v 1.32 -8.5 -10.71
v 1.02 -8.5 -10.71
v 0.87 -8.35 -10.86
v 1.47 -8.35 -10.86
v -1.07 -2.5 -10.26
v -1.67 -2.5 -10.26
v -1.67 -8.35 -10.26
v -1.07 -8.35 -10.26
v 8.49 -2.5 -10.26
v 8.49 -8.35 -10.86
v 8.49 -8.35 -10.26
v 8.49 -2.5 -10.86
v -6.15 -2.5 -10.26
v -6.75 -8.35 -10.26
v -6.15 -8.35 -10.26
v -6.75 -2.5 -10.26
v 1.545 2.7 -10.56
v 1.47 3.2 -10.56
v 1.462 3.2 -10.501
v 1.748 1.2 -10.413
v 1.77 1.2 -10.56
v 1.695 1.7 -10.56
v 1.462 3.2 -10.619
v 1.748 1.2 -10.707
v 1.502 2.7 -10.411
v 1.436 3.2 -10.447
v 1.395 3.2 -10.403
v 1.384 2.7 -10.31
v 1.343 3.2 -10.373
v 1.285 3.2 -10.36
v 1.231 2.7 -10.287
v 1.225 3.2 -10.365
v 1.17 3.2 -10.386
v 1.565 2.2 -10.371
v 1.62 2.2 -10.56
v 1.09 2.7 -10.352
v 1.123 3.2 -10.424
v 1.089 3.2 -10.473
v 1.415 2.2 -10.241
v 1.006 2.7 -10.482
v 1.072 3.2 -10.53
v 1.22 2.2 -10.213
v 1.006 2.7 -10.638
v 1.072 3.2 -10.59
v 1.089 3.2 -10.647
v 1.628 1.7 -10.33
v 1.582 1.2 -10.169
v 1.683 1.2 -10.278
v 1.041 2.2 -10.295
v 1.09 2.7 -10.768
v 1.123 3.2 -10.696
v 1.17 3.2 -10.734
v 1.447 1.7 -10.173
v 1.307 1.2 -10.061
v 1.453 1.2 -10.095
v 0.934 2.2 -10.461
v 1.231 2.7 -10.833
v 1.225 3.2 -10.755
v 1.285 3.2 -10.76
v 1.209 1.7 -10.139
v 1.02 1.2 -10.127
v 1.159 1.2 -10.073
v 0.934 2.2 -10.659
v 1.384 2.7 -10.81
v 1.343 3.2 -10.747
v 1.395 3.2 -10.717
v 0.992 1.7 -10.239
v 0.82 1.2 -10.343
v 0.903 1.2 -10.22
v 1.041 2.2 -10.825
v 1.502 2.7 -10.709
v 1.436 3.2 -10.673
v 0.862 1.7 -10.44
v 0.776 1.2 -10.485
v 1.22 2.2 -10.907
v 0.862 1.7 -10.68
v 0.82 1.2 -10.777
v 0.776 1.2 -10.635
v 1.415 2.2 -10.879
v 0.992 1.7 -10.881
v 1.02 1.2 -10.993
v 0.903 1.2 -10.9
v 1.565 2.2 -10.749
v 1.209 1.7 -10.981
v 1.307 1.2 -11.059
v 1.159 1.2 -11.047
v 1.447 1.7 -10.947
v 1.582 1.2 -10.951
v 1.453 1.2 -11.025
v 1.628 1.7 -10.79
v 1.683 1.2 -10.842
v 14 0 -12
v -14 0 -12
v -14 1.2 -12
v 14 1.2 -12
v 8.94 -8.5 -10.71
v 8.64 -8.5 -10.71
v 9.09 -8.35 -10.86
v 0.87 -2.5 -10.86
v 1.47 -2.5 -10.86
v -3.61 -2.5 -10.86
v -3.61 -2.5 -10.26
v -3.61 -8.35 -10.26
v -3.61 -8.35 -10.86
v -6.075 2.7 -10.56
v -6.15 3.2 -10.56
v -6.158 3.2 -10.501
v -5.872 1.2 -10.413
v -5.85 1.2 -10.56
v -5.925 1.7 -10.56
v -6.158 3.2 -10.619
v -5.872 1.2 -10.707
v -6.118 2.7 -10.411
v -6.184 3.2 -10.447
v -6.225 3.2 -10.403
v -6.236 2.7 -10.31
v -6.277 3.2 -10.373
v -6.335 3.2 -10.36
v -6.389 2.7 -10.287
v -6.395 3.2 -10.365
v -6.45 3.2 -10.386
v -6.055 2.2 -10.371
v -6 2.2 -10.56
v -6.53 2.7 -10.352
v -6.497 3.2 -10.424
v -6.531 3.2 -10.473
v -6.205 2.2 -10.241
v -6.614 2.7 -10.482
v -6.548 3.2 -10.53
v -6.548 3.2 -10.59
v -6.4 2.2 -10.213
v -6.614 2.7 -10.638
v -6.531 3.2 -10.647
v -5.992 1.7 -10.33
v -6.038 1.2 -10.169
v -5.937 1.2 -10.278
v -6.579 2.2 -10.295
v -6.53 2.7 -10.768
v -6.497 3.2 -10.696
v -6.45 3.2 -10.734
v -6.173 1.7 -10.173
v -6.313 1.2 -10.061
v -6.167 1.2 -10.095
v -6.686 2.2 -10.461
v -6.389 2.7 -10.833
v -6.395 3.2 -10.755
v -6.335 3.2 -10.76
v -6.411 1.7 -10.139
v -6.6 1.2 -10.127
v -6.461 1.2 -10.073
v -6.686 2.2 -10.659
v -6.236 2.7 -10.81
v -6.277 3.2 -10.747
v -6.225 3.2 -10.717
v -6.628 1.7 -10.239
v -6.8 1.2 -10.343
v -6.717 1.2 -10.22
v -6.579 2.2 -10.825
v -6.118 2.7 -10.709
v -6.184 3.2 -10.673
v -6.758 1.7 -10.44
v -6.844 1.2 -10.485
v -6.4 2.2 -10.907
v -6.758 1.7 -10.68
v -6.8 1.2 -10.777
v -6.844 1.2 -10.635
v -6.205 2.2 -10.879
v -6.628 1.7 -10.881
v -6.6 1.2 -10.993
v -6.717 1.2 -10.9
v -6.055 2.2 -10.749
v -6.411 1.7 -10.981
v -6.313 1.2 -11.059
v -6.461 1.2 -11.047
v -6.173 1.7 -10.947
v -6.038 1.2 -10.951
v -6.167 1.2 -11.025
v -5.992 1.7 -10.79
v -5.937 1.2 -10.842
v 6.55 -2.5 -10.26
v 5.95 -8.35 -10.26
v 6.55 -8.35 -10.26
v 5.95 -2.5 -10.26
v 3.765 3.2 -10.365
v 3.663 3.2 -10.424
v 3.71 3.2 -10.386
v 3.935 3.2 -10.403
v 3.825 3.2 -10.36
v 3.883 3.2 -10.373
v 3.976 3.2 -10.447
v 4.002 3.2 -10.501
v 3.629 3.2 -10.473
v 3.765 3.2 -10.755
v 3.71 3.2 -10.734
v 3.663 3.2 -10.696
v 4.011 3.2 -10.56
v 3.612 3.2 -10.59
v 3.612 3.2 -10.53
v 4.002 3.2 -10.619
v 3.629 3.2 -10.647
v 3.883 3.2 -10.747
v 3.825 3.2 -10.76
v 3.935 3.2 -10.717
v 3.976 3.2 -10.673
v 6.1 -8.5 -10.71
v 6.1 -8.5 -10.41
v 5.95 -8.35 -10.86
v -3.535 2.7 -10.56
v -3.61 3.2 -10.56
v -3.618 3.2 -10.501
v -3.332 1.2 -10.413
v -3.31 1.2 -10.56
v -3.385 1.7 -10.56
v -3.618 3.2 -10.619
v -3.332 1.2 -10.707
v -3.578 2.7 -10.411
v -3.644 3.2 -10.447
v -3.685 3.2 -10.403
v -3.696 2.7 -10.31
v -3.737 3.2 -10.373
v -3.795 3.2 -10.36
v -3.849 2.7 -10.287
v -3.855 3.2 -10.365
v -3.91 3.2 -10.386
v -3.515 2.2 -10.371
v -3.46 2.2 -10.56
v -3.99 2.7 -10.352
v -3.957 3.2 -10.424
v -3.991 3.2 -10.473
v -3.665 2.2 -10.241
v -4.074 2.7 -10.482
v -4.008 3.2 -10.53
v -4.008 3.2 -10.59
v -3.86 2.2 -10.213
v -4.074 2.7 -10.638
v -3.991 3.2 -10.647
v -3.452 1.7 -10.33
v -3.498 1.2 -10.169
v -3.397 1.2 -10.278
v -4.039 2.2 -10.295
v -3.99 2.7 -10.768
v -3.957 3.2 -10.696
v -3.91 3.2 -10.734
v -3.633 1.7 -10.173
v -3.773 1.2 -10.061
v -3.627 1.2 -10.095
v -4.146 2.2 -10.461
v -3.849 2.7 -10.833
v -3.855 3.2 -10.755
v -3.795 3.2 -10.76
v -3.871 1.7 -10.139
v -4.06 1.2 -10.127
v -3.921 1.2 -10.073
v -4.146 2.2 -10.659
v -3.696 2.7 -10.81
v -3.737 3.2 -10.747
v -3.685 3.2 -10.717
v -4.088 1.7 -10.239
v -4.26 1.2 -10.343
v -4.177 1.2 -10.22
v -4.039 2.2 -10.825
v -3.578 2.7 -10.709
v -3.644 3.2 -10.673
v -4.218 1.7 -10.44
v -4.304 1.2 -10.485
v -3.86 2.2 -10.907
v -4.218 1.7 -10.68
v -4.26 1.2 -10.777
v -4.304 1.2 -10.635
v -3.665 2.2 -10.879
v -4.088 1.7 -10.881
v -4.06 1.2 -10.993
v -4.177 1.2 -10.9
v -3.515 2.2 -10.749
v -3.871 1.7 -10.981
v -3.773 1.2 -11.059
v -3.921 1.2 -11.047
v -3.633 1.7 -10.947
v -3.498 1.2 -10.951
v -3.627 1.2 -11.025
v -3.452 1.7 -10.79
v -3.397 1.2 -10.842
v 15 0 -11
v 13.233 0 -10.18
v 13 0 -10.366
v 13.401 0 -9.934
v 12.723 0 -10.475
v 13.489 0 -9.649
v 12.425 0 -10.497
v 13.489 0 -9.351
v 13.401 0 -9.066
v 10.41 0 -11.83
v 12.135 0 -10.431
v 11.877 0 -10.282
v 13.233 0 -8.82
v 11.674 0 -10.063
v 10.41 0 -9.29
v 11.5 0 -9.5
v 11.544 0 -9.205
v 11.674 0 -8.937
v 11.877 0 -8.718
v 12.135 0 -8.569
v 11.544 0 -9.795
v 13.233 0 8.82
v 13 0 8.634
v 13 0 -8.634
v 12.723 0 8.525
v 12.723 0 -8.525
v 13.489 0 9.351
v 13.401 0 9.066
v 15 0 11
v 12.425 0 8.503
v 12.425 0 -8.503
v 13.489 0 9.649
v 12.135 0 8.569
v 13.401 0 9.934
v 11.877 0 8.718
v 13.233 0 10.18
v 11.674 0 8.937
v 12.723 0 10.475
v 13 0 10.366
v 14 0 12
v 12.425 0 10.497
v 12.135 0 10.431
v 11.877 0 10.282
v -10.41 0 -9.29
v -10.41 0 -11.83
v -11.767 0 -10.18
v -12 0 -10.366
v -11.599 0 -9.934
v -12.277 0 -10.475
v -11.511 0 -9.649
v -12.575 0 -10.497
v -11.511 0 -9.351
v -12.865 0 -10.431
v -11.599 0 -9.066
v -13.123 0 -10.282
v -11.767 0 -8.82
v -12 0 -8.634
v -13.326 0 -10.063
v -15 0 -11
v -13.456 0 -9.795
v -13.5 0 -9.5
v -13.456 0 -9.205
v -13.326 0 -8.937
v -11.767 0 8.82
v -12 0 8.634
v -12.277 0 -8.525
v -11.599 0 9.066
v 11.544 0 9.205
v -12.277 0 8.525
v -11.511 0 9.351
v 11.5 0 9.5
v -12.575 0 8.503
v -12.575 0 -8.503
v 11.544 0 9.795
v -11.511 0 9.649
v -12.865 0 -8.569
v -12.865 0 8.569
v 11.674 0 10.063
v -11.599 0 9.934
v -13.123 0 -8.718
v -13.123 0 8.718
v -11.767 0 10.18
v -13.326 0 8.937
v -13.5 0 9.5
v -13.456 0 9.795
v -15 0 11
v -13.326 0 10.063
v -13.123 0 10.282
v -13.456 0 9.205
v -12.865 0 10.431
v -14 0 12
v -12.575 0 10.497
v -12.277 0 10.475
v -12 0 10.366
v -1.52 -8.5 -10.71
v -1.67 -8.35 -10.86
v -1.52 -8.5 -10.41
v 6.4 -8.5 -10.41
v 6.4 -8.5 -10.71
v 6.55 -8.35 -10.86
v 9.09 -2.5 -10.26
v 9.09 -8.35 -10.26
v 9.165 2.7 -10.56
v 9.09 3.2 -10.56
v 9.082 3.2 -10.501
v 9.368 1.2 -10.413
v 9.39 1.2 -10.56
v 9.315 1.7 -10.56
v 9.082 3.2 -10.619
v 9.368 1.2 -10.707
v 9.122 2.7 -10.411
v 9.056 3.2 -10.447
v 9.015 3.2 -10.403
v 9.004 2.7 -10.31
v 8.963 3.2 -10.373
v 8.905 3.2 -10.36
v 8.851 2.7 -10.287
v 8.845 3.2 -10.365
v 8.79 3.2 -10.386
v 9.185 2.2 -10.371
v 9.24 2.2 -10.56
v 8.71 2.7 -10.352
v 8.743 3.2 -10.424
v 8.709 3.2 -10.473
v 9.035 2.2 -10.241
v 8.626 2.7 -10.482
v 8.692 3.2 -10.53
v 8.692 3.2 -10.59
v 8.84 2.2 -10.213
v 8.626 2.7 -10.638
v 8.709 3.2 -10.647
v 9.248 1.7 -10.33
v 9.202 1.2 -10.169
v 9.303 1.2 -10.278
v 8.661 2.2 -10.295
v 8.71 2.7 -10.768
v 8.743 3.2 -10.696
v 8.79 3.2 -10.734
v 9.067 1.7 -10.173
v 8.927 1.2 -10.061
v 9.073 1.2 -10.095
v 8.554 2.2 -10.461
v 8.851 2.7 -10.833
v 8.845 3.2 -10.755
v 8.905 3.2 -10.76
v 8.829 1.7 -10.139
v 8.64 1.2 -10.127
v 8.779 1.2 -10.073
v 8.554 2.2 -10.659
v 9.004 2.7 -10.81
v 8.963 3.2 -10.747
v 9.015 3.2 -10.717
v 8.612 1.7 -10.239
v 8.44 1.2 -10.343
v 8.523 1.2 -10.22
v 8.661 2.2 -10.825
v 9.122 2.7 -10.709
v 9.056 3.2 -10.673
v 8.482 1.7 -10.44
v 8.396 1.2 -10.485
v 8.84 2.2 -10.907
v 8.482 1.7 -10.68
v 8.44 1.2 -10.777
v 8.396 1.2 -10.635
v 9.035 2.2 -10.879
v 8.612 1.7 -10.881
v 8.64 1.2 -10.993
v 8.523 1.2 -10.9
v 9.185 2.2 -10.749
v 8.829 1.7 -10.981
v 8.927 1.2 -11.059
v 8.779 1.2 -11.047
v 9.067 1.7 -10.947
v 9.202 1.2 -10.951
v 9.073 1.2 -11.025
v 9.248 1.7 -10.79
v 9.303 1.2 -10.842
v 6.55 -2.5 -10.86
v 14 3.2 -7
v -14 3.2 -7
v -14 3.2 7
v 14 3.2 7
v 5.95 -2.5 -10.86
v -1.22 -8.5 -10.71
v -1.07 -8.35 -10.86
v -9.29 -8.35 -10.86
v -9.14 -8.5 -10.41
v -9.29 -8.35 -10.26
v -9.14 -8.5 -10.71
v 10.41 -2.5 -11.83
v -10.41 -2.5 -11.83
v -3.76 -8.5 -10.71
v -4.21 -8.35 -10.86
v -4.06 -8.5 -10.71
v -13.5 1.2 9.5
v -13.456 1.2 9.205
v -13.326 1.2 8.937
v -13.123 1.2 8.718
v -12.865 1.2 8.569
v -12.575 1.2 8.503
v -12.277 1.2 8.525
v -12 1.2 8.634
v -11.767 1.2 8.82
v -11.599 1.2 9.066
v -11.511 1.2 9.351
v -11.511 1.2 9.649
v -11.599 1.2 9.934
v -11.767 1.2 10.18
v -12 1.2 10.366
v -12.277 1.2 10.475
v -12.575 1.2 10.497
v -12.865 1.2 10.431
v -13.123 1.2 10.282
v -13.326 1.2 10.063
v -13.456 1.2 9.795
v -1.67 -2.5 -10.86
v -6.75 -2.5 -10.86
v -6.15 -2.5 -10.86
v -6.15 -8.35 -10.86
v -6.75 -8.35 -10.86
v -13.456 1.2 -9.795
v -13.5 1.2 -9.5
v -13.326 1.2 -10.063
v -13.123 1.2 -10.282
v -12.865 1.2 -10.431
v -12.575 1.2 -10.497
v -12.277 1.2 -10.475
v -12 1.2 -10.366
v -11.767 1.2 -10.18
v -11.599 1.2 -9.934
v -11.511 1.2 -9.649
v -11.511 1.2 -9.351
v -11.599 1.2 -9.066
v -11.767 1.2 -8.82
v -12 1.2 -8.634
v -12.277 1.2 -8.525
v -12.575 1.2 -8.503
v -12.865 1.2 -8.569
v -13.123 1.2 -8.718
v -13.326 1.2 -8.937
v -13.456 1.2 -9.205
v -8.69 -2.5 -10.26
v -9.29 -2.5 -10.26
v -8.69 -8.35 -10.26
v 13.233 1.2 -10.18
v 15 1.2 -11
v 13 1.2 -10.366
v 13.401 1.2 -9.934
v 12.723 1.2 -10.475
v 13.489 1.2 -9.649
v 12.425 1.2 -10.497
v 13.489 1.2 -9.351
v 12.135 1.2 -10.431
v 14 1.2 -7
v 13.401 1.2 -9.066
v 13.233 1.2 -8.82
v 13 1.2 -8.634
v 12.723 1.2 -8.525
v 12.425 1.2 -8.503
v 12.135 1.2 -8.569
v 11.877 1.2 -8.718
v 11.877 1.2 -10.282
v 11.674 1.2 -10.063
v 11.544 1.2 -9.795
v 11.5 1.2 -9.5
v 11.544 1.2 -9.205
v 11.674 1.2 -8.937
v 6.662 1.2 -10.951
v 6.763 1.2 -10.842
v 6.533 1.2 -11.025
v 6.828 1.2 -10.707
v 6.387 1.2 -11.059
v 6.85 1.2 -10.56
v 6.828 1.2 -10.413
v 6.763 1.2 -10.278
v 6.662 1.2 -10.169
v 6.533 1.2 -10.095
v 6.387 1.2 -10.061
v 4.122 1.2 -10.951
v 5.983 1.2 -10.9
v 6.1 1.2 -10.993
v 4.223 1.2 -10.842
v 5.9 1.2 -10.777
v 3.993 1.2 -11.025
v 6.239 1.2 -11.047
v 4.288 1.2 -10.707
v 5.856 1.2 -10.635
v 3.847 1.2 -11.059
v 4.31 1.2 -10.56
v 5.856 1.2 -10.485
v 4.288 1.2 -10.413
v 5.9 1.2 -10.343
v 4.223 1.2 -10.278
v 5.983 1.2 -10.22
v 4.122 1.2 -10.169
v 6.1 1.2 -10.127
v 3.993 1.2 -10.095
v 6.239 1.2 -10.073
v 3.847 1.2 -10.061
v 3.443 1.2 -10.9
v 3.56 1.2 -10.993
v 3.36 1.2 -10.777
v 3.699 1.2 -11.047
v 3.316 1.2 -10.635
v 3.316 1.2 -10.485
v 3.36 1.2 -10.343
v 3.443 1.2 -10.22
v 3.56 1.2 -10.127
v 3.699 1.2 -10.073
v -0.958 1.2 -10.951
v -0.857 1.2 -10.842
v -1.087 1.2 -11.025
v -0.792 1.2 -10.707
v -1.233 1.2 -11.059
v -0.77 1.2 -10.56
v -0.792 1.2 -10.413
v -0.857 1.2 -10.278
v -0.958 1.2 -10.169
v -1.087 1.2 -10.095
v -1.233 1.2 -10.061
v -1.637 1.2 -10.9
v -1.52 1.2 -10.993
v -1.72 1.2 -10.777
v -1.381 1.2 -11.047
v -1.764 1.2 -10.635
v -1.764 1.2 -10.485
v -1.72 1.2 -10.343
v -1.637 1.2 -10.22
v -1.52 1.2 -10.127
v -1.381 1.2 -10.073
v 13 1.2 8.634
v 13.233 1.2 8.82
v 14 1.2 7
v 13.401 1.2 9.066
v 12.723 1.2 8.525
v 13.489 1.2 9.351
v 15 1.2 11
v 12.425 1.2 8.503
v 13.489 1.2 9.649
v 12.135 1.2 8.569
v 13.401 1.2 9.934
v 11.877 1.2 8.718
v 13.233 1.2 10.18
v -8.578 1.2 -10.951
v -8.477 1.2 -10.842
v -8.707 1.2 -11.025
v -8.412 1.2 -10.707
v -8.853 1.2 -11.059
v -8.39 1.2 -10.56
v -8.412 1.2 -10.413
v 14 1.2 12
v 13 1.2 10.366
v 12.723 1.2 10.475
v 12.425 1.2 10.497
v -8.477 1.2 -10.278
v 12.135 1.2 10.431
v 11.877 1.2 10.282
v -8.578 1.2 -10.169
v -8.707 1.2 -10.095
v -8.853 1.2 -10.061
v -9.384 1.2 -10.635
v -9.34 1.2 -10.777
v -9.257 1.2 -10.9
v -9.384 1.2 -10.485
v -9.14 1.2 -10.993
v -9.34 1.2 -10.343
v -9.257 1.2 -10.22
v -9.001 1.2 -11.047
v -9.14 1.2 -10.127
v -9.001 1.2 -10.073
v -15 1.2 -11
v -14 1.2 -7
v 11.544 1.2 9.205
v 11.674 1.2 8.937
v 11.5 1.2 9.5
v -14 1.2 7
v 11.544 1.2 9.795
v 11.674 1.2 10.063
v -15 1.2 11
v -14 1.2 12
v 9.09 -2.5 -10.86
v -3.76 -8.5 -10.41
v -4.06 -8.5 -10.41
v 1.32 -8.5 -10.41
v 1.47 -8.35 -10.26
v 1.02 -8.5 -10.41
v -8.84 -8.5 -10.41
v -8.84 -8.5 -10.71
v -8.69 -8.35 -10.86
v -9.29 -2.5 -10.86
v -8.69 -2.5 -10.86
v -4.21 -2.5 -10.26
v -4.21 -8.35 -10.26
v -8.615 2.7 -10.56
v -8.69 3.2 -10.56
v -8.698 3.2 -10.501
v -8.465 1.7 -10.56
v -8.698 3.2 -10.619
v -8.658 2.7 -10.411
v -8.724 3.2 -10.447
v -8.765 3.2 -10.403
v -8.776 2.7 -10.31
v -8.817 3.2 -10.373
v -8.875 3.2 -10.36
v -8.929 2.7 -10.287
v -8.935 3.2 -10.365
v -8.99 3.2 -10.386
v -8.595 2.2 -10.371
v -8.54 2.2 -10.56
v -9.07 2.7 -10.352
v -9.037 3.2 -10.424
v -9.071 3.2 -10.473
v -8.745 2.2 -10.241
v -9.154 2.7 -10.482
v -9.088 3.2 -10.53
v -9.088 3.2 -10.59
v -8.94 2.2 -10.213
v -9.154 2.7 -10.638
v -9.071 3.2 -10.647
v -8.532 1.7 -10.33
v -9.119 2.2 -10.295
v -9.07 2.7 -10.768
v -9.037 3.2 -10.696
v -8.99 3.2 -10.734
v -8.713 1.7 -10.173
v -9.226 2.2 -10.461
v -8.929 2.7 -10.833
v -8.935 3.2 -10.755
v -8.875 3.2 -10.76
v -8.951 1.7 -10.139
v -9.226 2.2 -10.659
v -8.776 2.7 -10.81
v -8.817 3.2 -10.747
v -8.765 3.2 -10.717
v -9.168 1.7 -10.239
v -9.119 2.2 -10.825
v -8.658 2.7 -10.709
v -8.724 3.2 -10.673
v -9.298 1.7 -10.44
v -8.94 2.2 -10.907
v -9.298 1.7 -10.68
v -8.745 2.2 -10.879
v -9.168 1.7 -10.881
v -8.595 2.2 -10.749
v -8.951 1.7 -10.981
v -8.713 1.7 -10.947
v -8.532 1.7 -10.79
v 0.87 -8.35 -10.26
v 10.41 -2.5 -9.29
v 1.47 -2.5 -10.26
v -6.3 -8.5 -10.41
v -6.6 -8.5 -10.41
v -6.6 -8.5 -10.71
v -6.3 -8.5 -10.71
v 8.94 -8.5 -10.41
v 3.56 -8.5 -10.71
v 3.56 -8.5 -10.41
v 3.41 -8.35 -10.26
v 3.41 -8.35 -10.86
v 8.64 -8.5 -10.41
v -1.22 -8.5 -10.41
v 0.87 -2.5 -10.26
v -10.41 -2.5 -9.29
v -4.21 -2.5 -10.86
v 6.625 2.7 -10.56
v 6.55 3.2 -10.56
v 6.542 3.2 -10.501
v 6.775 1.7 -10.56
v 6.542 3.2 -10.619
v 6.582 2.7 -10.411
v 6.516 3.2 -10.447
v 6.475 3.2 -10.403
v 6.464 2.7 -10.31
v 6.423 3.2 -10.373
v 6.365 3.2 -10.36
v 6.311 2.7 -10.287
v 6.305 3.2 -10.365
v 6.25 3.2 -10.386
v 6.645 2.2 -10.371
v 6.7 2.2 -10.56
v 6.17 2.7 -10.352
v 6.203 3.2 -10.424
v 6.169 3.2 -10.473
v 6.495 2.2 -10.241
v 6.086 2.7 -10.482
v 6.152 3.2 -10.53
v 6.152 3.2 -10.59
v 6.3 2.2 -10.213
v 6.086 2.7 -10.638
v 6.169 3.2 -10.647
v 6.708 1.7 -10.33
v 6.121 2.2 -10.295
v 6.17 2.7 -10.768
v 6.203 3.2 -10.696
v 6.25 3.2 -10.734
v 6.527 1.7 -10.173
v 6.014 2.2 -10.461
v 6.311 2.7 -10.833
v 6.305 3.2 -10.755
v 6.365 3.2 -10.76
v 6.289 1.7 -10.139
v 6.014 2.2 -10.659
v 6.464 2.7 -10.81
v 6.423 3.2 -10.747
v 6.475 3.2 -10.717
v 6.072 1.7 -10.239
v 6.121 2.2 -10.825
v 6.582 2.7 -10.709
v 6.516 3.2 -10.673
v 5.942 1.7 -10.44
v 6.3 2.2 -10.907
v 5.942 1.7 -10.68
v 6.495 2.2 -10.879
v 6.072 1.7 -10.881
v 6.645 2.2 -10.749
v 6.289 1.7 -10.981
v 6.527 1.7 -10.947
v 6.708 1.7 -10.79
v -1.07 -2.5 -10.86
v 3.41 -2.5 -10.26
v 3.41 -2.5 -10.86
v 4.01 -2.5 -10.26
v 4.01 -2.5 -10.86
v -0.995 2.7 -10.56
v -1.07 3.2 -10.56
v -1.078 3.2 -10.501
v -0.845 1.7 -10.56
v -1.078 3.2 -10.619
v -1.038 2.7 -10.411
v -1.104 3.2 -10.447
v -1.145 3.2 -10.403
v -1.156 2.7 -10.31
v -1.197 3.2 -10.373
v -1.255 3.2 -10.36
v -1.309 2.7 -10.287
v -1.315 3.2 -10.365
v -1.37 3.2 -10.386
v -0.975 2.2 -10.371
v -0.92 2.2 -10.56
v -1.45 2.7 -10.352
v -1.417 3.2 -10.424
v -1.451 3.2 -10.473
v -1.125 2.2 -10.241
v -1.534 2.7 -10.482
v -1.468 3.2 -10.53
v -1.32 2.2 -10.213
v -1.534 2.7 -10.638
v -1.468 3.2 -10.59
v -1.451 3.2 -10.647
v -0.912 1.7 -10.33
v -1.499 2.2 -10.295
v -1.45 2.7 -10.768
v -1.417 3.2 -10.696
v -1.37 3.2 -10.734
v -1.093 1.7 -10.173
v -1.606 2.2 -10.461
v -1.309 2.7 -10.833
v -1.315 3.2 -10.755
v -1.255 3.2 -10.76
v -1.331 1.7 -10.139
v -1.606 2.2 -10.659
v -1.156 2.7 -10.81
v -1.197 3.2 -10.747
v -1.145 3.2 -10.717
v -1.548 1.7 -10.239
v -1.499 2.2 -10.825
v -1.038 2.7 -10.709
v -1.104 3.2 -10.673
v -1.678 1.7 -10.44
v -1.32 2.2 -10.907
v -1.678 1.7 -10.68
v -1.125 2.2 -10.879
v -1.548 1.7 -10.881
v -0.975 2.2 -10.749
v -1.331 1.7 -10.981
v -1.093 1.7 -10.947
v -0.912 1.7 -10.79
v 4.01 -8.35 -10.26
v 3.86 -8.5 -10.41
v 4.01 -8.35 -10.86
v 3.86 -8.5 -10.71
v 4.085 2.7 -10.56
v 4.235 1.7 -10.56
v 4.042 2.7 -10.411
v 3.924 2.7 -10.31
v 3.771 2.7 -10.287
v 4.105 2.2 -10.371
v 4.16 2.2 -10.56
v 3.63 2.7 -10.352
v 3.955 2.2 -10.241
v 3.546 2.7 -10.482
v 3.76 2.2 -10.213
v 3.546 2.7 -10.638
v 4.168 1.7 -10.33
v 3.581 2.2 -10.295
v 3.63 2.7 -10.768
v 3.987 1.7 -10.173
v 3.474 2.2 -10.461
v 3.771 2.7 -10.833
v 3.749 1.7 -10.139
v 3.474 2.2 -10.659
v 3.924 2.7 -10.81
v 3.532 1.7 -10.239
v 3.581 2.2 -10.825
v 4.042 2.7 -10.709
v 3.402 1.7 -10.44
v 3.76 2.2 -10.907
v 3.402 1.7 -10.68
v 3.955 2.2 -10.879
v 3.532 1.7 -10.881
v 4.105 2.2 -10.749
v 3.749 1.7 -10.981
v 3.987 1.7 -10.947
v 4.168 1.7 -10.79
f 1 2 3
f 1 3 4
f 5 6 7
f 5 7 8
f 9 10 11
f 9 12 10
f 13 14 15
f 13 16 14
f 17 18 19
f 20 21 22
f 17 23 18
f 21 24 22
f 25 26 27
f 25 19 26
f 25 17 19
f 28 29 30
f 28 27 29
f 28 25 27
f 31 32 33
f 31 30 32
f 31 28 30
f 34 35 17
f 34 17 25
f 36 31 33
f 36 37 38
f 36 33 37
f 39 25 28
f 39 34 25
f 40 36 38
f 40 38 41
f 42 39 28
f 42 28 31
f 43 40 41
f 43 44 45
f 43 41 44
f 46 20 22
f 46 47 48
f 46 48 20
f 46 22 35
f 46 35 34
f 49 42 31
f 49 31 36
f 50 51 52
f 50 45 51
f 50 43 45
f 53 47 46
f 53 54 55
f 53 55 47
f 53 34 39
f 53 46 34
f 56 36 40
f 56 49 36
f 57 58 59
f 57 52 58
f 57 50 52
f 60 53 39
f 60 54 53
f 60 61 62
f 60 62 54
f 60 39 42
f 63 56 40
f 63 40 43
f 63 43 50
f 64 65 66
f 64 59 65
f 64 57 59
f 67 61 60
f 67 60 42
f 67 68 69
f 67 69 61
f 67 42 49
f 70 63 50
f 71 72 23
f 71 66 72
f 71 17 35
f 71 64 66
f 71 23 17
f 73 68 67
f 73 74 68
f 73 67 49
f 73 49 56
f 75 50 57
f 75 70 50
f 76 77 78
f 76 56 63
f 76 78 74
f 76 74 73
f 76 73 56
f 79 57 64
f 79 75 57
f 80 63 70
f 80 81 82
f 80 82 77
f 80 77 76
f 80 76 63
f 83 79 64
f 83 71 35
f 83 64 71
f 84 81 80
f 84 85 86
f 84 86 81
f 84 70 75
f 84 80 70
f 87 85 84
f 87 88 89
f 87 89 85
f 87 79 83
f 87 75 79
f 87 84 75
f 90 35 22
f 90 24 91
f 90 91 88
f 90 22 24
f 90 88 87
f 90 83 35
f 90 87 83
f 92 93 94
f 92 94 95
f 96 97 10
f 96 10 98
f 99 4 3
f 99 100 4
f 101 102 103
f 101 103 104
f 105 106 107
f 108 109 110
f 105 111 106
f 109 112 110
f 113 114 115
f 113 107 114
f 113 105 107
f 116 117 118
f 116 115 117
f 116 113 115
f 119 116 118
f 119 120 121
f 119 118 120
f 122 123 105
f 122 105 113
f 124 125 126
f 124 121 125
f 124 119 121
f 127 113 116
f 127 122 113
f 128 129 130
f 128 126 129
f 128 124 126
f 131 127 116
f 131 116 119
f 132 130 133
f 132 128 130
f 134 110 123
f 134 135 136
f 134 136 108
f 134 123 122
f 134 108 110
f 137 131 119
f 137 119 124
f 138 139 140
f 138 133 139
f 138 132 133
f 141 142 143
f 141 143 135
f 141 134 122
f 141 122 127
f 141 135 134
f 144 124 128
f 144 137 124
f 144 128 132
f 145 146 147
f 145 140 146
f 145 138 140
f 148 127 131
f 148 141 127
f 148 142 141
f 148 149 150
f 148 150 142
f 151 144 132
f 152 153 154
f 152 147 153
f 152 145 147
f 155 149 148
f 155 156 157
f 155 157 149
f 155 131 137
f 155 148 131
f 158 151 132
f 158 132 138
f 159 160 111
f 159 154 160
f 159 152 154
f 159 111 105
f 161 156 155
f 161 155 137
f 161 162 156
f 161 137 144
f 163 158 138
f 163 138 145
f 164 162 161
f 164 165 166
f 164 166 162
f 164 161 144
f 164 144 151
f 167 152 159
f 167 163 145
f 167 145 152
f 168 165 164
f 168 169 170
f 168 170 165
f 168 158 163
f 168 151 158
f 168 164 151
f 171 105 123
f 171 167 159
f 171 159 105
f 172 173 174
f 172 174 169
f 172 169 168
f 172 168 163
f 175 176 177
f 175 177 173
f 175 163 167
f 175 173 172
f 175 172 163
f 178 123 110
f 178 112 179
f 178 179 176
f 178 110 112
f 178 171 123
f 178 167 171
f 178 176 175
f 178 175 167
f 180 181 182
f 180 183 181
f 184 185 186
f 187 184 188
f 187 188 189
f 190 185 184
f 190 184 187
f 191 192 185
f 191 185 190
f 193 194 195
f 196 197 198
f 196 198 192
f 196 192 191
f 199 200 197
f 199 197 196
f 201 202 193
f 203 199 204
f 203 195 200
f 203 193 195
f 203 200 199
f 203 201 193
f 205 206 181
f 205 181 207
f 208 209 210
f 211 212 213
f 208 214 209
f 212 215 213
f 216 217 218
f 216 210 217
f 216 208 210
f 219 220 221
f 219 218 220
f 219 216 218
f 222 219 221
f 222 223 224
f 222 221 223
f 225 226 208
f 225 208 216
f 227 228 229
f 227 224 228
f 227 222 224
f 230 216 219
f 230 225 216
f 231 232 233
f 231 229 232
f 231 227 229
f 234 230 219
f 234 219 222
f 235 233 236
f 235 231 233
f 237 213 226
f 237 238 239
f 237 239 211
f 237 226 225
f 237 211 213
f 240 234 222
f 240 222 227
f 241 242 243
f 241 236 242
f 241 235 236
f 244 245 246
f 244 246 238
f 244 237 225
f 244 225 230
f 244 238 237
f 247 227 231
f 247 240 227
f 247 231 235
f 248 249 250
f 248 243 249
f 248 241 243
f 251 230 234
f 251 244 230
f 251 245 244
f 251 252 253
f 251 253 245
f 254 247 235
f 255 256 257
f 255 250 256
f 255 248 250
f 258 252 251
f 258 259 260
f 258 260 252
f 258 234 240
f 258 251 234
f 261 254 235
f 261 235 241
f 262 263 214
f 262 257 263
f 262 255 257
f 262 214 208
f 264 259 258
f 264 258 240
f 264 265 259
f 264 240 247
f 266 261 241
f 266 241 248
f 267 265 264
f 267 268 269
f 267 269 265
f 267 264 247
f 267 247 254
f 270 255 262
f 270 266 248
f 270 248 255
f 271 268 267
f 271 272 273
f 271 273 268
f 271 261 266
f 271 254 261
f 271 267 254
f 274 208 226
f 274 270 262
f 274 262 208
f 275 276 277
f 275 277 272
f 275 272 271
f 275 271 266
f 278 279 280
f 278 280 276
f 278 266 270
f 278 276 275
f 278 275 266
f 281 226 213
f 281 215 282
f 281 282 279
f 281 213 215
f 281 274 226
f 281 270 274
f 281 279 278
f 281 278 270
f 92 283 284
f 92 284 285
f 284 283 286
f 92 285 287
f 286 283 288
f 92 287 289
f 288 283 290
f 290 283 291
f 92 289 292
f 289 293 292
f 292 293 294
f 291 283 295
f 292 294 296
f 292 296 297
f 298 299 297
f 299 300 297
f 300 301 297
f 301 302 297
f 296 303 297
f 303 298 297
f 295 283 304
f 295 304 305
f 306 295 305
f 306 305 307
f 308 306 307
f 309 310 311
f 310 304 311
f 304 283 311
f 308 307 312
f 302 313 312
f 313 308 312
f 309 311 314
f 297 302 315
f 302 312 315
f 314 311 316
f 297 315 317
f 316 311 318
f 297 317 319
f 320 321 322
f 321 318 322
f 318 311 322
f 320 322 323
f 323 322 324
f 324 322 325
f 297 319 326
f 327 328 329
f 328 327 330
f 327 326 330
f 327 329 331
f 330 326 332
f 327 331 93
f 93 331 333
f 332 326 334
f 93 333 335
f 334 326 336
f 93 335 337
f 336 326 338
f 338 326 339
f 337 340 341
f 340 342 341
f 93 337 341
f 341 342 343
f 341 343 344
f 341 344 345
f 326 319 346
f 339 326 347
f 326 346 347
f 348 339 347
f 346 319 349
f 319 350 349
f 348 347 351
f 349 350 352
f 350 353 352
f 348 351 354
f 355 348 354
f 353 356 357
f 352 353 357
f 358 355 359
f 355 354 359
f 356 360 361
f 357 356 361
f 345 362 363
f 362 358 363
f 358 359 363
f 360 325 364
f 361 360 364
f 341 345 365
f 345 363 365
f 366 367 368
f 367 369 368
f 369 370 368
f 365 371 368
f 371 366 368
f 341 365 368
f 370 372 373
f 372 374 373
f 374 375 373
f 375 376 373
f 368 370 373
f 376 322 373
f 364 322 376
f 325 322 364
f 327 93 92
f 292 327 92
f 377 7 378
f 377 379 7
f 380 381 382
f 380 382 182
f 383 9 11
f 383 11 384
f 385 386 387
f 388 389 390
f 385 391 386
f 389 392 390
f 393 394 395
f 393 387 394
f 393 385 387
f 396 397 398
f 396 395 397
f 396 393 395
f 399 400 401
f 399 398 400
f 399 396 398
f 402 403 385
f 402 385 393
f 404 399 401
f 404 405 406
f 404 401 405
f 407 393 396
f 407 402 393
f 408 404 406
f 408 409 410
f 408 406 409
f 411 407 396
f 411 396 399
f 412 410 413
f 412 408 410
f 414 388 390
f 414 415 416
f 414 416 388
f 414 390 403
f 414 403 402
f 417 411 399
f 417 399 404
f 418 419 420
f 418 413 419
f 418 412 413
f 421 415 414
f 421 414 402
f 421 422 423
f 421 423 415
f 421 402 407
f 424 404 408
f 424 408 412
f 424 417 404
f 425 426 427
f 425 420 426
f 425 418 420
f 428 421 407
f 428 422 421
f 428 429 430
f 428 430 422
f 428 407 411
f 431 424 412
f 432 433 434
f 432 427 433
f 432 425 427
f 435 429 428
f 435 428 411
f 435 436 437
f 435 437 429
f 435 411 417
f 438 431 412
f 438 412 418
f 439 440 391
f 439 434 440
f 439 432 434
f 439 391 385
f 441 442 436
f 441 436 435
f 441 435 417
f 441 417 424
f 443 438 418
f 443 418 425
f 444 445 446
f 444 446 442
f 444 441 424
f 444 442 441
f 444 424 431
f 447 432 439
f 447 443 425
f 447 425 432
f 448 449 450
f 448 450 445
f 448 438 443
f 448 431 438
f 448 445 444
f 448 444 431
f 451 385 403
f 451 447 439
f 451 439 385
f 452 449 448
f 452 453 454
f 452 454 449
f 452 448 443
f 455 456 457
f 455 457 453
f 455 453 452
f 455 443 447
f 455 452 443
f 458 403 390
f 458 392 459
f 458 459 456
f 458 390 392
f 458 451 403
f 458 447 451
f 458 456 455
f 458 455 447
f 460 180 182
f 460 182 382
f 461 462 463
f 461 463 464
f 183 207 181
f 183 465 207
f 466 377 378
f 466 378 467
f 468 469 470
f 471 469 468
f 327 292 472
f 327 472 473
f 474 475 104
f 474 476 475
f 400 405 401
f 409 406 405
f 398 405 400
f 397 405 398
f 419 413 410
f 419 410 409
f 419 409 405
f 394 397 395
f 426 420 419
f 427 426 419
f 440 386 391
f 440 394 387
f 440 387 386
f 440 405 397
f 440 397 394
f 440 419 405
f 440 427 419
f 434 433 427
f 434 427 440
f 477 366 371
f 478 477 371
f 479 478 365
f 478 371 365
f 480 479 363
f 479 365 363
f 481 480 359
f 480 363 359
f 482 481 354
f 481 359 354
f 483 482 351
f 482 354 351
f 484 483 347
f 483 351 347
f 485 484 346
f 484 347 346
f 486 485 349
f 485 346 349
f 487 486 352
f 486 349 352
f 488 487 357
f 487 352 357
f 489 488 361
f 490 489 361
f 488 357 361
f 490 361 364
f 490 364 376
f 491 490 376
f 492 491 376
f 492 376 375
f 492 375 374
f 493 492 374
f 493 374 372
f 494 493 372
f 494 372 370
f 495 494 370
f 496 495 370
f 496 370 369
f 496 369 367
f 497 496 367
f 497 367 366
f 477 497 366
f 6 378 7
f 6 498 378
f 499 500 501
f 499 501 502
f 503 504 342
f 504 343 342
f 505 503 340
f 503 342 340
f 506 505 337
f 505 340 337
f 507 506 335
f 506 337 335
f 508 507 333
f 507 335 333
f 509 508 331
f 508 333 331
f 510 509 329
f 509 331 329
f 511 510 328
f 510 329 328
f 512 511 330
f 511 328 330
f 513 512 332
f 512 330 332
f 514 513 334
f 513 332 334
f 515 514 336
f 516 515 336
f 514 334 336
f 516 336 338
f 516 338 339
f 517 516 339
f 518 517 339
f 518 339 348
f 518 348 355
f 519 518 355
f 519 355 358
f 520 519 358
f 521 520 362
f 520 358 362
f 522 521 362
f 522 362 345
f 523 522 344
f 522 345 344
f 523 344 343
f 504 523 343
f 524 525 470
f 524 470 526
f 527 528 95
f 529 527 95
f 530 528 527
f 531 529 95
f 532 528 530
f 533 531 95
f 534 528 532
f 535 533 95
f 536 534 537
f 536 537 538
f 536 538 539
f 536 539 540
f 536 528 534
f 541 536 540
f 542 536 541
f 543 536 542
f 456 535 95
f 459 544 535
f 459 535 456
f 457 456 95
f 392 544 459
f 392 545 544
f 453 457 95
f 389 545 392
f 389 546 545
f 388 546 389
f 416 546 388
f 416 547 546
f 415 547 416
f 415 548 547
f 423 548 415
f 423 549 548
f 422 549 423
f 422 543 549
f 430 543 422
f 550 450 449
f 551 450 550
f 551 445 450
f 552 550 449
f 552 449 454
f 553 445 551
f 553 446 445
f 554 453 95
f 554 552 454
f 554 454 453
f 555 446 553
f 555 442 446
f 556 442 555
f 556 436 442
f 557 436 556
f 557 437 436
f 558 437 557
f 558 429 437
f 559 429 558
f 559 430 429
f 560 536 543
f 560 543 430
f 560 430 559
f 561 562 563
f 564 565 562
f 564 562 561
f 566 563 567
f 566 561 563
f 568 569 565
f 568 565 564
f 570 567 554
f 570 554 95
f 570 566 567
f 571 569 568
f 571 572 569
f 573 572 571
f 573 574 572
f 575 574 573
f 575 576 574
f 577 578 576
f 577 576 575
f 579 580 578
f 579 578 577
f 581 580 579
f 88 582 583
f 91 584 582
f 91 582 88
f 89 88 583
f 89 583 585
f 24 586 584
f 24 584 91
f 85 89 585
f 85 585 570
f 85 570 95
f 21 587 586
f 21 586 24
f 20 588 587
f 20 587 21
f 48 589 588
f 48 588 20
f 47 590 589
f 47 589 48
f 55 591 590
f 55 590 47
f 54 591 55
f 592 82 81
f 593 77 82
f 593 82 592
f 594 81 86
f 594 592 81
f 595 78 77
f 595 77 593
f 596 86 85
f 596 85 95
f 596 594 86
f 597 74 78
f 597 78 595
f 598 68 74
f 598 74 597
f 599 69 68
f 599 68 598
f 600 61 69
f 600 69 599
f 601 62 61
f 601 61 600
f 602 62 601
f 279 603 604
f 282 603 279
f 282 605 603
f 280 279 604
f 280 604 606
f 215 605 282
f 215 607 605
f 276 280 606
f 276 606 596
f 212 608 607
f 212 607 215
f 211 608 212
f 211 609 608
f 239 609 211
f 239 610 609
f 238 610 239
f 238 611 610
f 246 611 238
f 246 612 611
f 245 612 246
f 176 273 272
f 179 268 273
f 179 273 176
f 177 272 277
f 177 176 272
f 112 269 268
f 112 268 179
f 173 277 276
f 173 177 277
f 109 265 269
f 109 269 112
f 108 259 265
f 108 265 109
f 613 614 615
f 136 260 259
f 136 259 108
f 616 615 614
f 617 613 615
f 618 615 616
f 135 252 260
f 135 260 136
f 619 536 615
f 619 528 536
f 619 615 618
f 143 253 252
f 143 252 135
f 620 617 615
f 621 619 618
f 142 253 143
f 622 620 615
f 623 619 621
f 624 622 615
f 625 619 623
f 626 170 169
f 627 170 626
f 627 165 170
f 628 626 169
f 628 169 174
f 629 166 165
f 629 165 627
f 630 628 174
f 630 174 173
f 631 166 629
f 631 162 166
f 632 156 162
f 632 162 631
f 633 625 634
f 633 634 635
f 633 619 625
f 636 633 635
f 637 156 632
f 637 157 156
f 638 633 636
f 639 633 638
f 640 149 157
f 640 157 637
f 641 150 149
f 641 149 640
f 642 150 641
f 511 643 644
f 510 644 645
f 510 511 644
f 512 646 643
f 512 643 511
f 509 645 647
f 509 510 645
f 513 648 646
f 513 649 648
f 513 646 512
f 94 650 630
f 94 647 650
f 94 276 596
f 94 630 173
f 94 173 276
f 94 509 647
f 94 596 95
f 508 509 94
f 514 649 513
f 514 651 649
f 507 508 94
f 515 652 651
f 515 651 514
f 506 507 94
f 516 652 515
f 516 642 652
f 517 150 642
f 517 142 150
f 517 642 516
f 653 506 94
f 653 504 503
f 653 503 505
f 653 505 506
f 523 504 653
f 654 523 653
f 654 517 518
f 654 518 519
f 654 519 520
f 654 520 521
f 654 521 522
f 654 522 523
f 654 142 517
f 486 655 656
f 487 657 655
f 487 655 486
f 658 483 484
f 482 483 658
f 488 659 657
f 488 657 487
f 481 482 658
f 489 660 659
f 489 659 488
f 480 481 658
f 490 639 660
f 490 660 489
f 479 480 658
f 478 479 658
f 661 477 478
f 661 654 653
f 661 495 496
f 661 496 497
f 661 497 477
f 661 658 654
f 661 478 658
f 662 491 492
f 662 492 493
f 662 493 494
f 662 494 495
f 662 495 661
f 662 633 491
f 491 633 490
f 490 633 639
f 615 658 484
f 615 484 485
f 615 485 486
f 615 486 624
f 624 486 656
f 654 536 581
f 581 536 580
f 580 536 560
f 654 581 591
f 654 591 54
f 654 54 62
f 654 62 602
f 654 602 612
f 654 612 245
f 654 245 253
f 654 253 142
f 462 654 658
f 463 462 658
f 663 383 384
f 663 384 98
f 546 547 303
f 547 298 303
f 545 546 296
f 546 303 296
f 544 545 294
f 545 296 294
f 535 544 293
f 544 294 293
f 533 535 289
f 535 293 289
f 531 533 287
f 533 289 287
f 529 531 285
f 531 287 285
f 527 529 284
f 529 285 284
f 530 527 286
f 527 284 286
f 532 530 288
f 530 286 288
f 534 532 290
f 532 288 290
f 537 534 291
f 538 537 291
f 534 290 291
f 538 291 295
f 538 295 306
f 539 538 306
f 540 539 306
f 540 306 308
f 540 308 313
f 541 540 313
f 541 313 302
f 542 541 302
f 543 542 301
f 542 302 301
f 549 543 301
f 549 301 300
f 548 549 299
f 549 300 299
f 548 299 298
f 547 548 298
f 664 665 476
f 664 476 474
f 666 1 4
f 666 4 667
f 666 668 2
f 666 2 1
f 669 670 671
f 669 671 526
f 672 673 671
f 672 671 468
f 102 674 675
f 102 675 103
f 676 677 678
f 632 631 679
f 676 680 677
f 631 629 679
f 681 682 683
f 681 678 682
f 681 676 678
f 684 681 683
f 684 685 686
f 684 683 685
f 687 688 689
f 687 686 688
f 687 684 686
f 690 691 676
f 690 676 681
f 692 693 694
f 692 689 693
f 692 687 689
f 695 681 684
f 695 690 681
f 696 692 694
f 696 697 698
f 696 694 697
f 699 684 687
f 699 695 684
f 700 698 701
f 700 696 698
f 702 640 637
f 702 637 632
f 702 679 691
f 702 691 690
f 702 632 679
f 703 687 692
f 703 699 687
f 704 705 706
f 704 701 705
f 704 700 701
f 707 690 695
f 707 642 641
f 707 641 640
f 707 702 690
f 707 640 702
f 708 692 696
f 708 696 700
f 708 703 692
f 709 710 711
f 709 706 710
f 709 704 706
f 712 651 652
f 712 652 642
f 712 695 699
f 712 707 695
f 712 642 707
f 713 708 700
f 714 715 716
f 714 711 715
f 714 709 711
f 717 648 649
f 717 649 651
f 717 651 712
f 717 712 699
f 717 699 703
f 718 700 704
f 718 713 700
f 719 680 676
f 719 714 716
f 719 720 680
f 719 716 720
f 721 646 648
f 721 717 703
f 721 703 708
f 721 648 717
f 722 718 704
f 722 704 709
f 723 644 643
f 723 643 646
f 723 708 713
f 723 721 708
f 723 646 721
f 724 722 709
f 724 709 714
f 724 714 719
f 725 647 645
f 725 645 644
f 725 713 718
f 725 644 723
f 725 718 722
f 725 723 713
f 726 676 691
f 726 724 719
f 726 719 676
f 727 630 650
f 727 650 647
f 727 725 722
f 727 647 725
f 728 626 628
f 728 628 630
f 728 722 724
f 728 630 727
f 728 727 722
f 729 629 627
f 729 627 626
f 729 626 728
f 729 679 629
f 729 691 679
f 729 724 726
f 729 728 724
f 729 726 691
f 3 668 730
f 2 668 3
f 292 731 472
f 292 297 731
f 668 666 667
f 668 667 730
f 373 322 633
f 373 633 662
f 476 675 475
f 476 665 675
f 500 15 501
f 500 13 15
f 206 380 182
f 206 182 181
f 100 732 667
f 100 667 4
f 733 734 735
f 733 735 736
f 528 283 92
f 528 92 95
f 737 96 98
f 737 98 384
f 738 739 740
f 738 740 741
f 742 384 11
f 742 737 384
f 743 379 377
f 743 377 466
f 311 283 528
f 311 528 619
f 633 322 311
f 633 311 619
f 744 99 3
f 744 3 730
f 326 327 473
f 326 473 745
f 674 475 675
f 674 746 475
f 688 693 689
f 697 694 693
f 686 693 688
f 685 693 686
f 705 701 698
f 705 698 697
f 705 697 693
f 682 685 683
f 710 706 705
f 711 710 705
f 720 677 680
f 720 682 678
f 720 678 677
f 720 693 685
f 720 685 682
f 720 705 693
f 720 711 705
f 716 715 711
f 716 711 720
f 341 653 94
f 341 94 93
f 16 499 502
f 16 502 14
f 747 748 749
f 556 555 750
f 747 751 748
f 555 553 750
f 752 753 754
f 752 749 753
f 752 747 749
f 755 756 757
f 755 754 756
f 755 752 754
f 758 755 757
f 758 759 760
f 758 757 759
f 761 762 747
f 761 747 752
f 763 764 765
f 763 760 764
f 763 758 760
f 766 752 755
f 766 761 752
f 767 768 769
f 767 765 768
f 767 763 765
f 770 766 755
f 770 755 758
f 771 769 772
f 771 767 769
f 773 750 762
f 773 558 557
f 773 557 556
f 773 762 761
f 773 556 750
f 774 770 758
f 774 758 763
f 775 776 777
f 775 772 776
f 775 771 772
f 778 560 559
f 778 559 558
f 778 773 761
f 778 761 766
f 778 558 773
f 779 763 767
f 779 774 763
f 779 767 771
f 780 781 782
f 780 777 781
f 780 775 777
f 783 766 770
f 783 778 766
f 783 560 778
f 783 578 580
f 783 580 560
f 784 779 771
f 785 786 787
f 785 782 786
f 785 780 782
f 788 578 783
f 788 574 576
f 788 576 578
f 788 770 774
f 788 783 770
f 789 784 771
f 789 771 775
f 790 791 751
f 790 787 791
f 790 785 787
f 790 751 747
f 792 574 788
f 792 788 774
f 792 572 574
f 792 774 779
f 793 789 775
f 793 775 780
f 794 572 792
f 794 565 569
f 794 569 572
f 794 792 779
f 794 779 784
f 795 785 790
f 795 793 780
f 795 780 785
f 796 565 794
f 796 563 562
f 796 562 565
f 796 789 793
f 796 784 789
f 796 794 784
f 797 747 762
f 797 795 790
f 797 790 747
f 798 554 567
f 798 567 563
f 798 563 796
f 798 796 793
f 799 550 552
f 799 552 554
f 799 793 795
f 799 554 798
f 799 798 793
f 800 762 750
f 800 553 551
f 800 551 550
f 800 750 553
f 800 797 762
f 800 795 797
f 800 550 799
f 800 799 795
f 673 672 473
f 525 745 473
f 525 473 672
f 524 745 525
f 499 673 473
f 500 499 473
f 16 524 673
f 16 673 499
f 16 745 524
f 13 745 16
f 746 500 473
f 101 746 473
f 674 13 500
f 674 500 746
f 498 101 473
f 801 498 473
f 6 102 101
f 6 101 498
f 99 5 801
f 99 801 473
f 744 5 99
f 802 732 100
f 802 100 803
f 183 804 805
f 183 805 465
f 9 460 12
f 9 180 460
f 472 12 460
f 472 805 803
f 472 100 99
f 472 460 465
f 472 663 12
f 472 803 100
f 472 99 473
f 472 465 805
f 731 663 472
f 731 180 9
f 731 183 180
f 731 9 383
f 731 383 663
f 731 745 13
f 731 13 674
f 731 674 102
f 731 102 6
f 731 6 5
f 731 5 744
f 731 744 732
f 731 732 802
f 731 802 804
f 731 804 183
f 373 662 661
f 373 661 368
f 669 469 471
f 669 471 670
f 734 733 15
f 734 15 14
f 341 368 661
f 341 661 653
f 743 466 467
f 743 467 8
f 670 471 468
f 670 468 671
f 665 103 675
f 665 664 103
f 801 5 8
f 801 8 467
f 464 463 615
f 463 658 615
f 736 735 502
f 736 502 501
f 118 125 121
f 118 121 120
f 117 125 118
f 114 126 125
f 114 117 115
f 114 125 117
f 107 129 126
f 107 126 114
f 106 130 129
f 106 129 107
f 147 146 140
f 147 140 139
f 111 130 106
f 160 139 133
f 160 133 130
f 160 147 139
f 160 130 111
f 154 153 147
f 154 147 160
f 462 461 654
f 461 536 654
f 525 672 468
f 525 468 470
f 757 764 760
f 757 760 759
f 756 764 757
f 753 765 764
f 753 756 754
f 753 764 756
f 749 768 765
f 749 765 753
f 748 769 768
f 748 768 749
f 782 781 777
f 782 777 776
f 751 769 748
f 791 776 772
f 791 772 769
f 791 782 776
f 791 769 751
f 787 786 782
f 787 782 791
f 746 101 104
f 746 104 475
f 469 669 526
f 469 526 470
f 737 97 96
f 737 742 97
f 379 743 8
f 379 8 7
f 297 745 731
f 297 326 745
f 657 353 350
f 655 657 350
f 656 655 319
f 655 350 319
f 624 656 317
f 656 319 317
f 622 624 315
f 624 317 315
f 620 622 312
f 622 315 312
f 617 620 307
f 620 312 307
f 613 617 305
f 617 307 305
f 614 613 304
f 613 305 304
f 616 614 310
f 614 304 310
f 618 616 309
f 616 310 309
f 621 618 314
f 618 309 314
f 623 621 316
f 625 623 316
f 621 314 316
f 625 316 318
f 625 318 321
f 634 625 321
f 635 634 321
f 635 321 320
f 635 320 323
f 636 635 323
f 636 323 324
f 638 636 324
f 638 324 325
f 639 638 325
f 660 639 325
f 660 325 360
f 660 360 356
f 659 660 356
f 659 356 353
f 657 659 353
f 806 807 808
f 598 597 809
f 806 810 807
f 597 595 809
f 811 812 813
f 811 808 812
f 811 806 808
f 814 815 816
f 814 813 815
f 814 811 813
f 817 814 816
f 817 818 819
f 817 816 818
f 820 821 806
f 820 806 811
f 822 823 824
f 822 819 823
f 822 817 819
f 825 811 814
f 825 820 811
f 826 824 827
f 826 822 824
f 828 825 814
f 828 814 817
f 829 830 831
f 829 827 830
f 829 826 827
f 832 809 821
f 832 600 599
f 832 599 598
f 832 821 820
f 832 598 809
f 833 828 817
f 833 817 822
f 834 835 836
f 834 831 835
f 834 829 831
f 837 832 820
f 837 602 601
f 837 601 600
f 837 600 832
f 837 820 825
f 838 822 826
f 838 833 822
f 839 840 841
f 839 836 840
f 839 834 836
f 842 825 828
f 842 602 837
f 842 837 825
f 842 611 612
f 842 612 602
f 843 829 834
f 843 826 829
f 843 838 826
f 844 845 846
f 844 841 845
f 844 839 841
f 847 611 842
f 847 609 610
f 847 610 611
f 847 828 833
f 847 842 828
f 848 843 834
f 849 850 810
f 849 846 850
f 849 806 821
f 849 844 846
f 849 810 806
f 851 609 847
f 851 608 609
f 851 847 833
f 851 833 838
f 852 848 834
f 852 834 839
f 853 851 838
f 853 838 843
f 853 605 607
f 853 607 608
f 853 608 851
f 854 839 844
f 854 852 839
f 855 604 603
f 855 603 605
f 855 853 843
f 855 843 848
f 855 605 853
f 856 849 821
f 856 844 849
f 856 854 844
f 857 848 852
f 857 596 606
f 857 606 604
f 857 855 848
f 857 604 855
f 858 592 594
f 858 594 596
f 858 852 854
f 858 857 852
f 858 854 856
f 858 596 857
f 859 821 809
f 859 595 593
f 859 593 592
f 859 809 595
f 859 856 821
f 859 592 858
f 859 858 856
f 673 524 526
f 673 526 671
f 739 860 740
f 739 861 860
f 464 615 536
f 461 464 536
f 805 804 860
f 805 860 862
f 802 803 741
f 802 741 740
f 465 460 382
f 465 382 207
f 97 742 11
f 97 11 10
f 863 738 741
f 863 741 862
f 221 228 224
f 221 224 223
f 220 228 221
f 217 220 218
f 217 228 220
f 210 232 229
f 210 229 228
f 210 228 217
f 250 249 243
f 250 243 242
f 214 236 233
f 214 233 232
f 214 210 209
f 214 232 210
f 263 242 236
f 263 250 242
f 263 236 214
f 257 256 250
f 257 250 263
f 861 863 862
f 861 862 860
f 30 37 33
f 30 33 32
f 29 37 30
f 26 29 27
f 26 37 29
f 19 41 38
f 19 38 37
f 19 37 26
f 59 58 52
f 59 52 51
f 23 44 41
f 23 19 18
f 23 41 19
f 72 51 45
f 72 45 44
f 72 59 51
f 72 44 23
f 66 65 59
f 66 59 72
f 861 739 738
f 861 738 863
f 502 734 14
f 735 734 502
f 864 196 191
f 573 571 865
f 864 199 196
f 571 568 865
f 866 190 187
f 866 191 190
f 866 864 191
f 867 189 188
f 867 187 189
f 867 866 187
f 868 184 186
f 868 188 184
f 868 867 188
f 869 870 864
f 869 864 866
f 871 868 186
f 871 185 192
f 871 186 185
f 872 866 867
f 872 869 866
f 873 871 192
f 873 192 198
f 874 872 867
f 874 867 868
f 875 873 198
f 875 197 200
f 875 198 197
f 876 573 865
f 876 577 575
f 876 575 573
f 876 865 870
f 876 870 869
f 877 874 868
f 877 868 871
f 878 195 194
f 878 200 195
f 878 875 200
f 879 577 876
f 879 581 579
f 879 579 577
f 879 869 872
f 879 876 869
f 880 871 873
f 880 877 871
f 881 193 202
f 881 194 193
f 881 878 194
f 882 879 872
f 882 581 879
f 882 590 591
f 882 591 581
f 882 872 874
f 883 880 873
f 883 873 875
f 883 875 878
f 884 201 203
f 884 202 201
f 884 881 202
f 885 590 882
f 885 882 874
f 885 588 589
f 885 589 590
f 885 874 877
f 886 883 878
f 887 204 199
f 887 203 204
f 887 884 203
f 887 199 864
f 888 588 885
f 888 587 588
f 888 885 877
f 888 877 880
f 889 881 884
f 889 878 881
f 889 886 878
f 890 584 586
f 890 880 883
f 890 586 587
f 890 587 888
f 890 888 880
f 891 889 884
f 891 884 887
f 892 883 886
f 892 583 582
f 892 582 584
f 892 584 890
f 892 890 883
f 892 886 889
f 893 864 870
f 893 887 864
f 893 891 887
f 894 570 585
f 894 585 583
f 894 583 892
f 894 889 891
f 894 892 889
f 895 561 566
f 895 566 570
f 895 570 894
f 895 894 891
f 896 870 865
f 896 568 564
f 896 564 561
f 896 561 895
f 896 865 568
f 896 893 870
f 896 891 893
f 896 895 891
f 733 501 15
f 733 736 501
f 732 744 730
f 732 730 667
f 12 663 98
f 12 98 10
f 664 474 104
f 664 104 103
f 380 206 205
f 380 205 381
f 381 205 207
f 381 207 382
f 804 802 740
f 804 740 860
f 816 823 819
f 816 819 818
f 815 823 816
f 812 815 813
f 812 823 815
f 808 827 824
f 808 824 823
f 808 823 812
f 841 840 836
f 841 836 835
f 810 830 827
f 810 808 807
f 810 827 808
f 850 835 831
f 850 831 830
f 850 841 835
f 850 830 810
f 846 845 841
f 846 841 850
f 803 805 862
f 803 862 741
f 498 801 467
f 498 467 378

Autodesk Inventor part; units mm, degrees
ref_plane "YZ Plane" through (0, 0, 0) normal (1, 0, 0) x (0, 1, 0)
ref_plane "XZ Plane" through (0, 0, 0) normal (0, 1, 0) x (-1, 0, 0)
ref_plane "XY Plane" through (0, 0, 0) normal (0, 0, 1) x (1, 0, 0)
sketch "스케치1" plane through (0, 0, 0) normal (0, 1, 0) x (-1, 0, 0)
  line L0 (15, -12) -> (-15, -12)
  line L1 (-15, -12) -> (-15, 12)
  line L2 (-15, 12) -> (15, 12)
  line L3 (15, 12) -> (15, -12)
  line L4 (15, -12) -> (-15, 12) construction
  line L5 (-15, -12) -> (15, 12) construction
  line L6 (12.5, 9.5) -> (-12.5, 9.5)
  line L7 (-12.5, 9.5) -> (-12.5, -9.5)
  line L8 (-12.5, -9.5) -> (12.5, -9.5)
  line L9 (12.5, -9.5) -> (12.5, 9.5)
  line L10 (12.5, 9.5) -> (-12.5, -9.5) construction
  line L11 (-12.5, 9.5) -> (12.5, -9.5) construction
  circle A0 centre (12.5, -9.5) radius 1
  circle A1 centre (-12.5, -9.5) radius 1
  circle A2 centre (-12.5, 9.5) radius 1
  circle A3 centre (12.5, 9.5) radius 1
  point P0 (0, 0)
  dimension "d0" = 30
  dimension "d1" = 24
  dimension "d2" = 25
  dimension "d3" = 19
  dimension "d4" = 2
  dimension "d5" = 2
  dimension "d6" = 2
  dimension "d7" = 2
extrude "돌출1" add sketch "스케치1" along normal blind 1.2 contours L0 L1 L2 L3 | L6 A3 L9 A0 L8 A1 L7 A2
sketch "스케치2" plane through (0, 1.2, 0) normal (0, 1, 0) x (1, 0, 0)
  line L0 (-14, -7) -> (14, -7)
  line L1 (14, -7) -> (14, 7)
  line L2 (14, 7) -> (-14, 7)
  line L3 (-14, 7) -> (-14, -7)
  line L4 (-14, -7) -> (14, 7) construction
  line L5 (14, -7) -> (-14, 7) construction
  point P0 (0, 0)
  dimension "d10" = 28
  dimension "d11" = 14
extrude "돌출2" add sketch "스케치2" along normal blind 2
sketch "스케치3" plane through (0, 1.2, 0) normal (0, 1, 0) x (1, 0, 0)
  line L0 (15, -12) -> (15, 12) projected
  line L1 (15, 12) -> (-15, 12) projected
  circle A0 centre (-8.89, 10.56) radius 0.5
  circle A1 centre (-6.35, 10.56) radius 0.5
  circle A2 centre (-3.81, 10.56) radius 0.5
  circle A3 centre (-1.27, 10.56) radius 0.5
  circle A4 centre (1.27, 10.56) radius 0.5
  circle A5 centre (3.81, 10.56) radius 0.5
  circle A6 centre (6.35, 10.56) radius 0.5
  circle A7 centre (8.89, 10.56) radius 0.5
  point P0 (0, 0)
  dimension "d14" = 2.54
  dimension "d15" = 2.54
  dimension "d16" = 2.54
  dimension "d17" = 2.54
  dimension "d18" = 2.54
  dimension "d19" = 2.54
  dimension "d20" = 2.54
  dimension "d22" = 1.44
  dimension "d23" = 1
  dimension "d24" = 1
  dimension "d25" = 1
  dimension "d26" = 1
  dimension "d27" = 1
  dimension "d28" = 1
  dimension "d29" = 1
  dimension "d53" = 1
  dimension "d113" = 13.73
extrude "돌출3" add sketch "스케치3" along normal blind 2
chamfer "모따기1" distance 0.3 distance2 2 1 edges at (5.85, 3.2, -10.56) measured on face at (6.1668, 3.2, -10.6561)
chamfer "모따기2" distance 0.3 distance2 2 1 edges at (3.31, 3.2, -10.56) measured on face at (3.8691, 3.2, -10.4042)
chamfer "모따기3" distance 0.3 distance2 2 1 edges at (0.77, 3.2, -10.56) measured on face at (1.1007, 3.2, -10.7255)
chamfer "모따기4" distance 0.3 distance2 2 1 edges at (-1.77, 3.2, -10.56) measured on face at (-1.4393, 3.2, -10.7255)
chamfer "모따기5" distance 0.3 distance2 2 1 edges at (-4.31, 3.2, -10.56) measured on face at (-3.8038, 3.2, -10.4639)
chamfer "모따기6" distance 0.3 distance2 2 1 edges at (-6.85, 3.2, -10.56) measured on face at (-6.4319, 3.2, -10.5921)
chamfer "모따기7" distance 0.3 distance2 2 1 edges at (-9.39, 3.2, -10.56) measured on face at (-9.0639, 3.2, -10.4132)
chamfer "모따기8" distance 0.3 distance2 2 1 edges at (8.39, 3.2, -10.56) measured on face at (9.0549, 3.2, -10.6705)
sketch "스케치4" plane through (0, 0, 0) normal (0, -1, 0) x (1, 0, 0)
  circle A0 centre (6.35, -10.56) radius 0.5 projected
  circle A1 centre (3.81, -10.56) radius 0.5 projected
  circle A2 centre (1.27, -10.56) radius 0.5 projected
  circle A3 centre (-1.27, -10.56) radius 0.5 projected
  circle A4 centre (-3.81, -10.56) radius 0.5 projected
  circle A5 centre (-6.35, -10.56) radius 0.5 projected
  circle A6 centre (-8.89, -10.56) radius 0.5 projected
  circle A7 centre (8.89, -10.56) radius 0.5 projected
  line L0 (10.41, -11.83) -> (-10.41, -11.83)
  line L1 (-10.41, -11.83) -> (-10.41, -9.29)
  line L2 (-10.41, -9.29) -> (10.41, -9.29)
  line L3 (10.41, -9.29) -> (10.41, -11.83)
  point P0 (0, 0)
  dimension "d57" = 20.82
  dimension "d58" = 2.54
  dimension "d59" = 1.52
  dimension "d60" = 1.27
extrude "돌출4" add sketch "스케치4" along normal blind 2.5 contours A0 | A1 | A2 | A3 | A4 | A5 | A6 | A7 | L0 L1 L2 L3
sketch "스케치5" plane through (0, -2.5, 0) normal (0, -1, 0) x (1, 0, 0)
  circle A0 centre (8.89, -10.56) radius 0.5 projected
  circle A1 centre (6.35, -10.56) radius 0.5 projected
  circle A2 centre (3.81, -10.56) radius 0.5 projected
  circle A3 centre (1.27, -10.56) radius 0.5 projected
  circle A4 centre (-1.27, -10.56) radius 0.5 projected
  circle A5 centre (-3.81, -10.56) radius 0.5 projected
  circle A6 centre (-6.35, -10.56) radius 0.5 projected
  circle A7 centre (-8.89, -10.56) radius 0.5 projected
  line L0 (9.09, -10.86) -> (8.49, -10.86)
  line L1 (8.49, -10.86) -> (8.49, -10.26)
  line L2 (8.49, -10.26) -> (9.09, -10.26)
  line L3 (9.09, -10.26) -> (9.09, -10.86)
  line L4 (9.09, -10.86) -> (8.49, -10.26) construction
  line L5 (8.49, -10.86) -> (9.09, -10.26) construction
  line L6 (6.55, -10.86) -> (5.95, -10.86)
  line L7 (6.55, -10.26) -> (6.55, -10.86)
  line L8 (5.95, -10.26) -> (6.55, -10.26)
  line L9 (5.95, -10.86) -> (5.95, -10.26)
  line L10 (4.01, -10.86) -> (3.41, -10.86)
  line L11 (4.01, -10.26) -> (4.01, -10.86)
  line L12 (3.41, -10.26) -> (4.01, -10.26)
  line L13 (3.41, -10.86) -> (3.41, -10.26)
  line L14 (1.47, -10.86) -> (0.87, -10.86)
  line L15 (1.47, -10.26) -> (1.47, -10.86)
  line L16 (0.87, -10.26) -> (1.47, -10.26)
  line L17 (0.87, -10.86) -> (0.87, -10.26)
  line L18 (-1.07, -10.86) -> (-1.67, -10.86)
  line L19 (-1.07, -10.26) -> (-1.07, -10.86)
  line L20 (-1.67, -10.26) -> (-1.07, -10.26)
  line L21 (-1.67, -10.86) -> (-1.67, -10.26)
  line L22 (-3.61, -10.86) -> (-4.21, -10.86)
  line L23 (-3.61, -10.26) -> (-3.61, -10.86)
  line L24 (-4.21, -10.26) -> (-3.61, -10.26)
  line L25 (-4.21, -10.86) -> (-4.21, -10.26)
  line L26 (-6.15, -10.86) -> (-6.75, -10.86)
  line L27 (-6.15, -10.26) -> (-6.15, -10.86)
  line L28 (-6.75, -10.26) -> (-6.15, -10.26)
  line L29 (-6.75, -10.86) -> (-6.75, -10.26)
  line L30 (-8.69, -10.86) -> (-9.29, -10.86)
  line L31 (-8.69, -10.26) -> (-8.69, -10.86)
  line L32 (-9.29, -10.26) -> (-8.69, -10.26)
  line L33 (-9.29, -10.86) -> (-9.29, -10.26)
  point P0 (0, 0)
  point P1 (8.79, -10.56)
  point P2 (-1.27, -10.56)
  point P3 (-3.81, -10.56)
  point P4 (-6.35, -10.56)
  point P5 (-8.89, -10.56)
  dimension "d63" = 0.6
  dimension "d64" = 0.6
  dimension "d67" = 2.54
extrude "돌출5" add sketch "스케치5" along normal blind 6 contours L2 L3 L0 L1 | L8 L7 L6 L9 | L12 L11 L10 L13 | L16 L15 L14 L17 | L20 L19 L18 L21 | L24 L23 L22 L25 | L28 L27 L26 L29 | L32 L31 L30 L33
chamfer "모따기9" distance 0.15 angle 45 32 edges at (8.79, -8.5, -10.86) (8.49, -8.5, -10.56) (8.79, -8.5, -10.26) (9.09, -8.5, -10.56) (6.25, -8.5, -10.86) (6.55, -8.5, -10.56) (6.25, -8.5, -10.26) (5.95, -8.5, -10.56) (3.71, -8.5, -10.86) (3.41, -8.5, -10.56) (3.71, -8.5, -10.26) (4.01, -8.5, -10.56) (1.17, -8.5, -10.26) (0.87, -8.5, -10.56) (1.17, -8.5, -10.86) (1.47, -8.5, -10.56) (-1.37, -8.5, -10.86) (-1.07, -8.5, -10.56) (-1.37, -8.5, -10.26) (-1.67, -8.5, -10.56) (-3.91, -8.5, -10.86) (-3.61, -8.5, -10.56) (-3.91, -8.5, -10.26) (-4.21, -8.5, -10.56) (-6.15, -8.5, -10.56) (-6.45, -8.5, -10.86) (-6.75, -8.5, -10.56) (-6.45, -8.5, -10.26) (-8.99, -8.5, -10.86) (-8.69, -8.5, -10.56) (-8.99, -8.5, -10.26) (-9.29, -8.5, -10.56)
chamfer "모따기10" distance 1 angle 45 4 edges at (15, 0.6, -12) (15, 0.6, 12) (-15, 0.6, 12) (-15, 0.6, -12)
equation "\"d5\" = d4"
equation "\"d6\" = d4"
equation "\"d7\" = d4"
equation "\"d15\" = d14"
equation "\"d16\" = d14"
equation "\"d17\" = d14"
equation "\"d18\" = d14"
equation "\"d19\" = d14"
equation "\"d20\" = d14"
properties part number "SPI_Display_0.96inch"
